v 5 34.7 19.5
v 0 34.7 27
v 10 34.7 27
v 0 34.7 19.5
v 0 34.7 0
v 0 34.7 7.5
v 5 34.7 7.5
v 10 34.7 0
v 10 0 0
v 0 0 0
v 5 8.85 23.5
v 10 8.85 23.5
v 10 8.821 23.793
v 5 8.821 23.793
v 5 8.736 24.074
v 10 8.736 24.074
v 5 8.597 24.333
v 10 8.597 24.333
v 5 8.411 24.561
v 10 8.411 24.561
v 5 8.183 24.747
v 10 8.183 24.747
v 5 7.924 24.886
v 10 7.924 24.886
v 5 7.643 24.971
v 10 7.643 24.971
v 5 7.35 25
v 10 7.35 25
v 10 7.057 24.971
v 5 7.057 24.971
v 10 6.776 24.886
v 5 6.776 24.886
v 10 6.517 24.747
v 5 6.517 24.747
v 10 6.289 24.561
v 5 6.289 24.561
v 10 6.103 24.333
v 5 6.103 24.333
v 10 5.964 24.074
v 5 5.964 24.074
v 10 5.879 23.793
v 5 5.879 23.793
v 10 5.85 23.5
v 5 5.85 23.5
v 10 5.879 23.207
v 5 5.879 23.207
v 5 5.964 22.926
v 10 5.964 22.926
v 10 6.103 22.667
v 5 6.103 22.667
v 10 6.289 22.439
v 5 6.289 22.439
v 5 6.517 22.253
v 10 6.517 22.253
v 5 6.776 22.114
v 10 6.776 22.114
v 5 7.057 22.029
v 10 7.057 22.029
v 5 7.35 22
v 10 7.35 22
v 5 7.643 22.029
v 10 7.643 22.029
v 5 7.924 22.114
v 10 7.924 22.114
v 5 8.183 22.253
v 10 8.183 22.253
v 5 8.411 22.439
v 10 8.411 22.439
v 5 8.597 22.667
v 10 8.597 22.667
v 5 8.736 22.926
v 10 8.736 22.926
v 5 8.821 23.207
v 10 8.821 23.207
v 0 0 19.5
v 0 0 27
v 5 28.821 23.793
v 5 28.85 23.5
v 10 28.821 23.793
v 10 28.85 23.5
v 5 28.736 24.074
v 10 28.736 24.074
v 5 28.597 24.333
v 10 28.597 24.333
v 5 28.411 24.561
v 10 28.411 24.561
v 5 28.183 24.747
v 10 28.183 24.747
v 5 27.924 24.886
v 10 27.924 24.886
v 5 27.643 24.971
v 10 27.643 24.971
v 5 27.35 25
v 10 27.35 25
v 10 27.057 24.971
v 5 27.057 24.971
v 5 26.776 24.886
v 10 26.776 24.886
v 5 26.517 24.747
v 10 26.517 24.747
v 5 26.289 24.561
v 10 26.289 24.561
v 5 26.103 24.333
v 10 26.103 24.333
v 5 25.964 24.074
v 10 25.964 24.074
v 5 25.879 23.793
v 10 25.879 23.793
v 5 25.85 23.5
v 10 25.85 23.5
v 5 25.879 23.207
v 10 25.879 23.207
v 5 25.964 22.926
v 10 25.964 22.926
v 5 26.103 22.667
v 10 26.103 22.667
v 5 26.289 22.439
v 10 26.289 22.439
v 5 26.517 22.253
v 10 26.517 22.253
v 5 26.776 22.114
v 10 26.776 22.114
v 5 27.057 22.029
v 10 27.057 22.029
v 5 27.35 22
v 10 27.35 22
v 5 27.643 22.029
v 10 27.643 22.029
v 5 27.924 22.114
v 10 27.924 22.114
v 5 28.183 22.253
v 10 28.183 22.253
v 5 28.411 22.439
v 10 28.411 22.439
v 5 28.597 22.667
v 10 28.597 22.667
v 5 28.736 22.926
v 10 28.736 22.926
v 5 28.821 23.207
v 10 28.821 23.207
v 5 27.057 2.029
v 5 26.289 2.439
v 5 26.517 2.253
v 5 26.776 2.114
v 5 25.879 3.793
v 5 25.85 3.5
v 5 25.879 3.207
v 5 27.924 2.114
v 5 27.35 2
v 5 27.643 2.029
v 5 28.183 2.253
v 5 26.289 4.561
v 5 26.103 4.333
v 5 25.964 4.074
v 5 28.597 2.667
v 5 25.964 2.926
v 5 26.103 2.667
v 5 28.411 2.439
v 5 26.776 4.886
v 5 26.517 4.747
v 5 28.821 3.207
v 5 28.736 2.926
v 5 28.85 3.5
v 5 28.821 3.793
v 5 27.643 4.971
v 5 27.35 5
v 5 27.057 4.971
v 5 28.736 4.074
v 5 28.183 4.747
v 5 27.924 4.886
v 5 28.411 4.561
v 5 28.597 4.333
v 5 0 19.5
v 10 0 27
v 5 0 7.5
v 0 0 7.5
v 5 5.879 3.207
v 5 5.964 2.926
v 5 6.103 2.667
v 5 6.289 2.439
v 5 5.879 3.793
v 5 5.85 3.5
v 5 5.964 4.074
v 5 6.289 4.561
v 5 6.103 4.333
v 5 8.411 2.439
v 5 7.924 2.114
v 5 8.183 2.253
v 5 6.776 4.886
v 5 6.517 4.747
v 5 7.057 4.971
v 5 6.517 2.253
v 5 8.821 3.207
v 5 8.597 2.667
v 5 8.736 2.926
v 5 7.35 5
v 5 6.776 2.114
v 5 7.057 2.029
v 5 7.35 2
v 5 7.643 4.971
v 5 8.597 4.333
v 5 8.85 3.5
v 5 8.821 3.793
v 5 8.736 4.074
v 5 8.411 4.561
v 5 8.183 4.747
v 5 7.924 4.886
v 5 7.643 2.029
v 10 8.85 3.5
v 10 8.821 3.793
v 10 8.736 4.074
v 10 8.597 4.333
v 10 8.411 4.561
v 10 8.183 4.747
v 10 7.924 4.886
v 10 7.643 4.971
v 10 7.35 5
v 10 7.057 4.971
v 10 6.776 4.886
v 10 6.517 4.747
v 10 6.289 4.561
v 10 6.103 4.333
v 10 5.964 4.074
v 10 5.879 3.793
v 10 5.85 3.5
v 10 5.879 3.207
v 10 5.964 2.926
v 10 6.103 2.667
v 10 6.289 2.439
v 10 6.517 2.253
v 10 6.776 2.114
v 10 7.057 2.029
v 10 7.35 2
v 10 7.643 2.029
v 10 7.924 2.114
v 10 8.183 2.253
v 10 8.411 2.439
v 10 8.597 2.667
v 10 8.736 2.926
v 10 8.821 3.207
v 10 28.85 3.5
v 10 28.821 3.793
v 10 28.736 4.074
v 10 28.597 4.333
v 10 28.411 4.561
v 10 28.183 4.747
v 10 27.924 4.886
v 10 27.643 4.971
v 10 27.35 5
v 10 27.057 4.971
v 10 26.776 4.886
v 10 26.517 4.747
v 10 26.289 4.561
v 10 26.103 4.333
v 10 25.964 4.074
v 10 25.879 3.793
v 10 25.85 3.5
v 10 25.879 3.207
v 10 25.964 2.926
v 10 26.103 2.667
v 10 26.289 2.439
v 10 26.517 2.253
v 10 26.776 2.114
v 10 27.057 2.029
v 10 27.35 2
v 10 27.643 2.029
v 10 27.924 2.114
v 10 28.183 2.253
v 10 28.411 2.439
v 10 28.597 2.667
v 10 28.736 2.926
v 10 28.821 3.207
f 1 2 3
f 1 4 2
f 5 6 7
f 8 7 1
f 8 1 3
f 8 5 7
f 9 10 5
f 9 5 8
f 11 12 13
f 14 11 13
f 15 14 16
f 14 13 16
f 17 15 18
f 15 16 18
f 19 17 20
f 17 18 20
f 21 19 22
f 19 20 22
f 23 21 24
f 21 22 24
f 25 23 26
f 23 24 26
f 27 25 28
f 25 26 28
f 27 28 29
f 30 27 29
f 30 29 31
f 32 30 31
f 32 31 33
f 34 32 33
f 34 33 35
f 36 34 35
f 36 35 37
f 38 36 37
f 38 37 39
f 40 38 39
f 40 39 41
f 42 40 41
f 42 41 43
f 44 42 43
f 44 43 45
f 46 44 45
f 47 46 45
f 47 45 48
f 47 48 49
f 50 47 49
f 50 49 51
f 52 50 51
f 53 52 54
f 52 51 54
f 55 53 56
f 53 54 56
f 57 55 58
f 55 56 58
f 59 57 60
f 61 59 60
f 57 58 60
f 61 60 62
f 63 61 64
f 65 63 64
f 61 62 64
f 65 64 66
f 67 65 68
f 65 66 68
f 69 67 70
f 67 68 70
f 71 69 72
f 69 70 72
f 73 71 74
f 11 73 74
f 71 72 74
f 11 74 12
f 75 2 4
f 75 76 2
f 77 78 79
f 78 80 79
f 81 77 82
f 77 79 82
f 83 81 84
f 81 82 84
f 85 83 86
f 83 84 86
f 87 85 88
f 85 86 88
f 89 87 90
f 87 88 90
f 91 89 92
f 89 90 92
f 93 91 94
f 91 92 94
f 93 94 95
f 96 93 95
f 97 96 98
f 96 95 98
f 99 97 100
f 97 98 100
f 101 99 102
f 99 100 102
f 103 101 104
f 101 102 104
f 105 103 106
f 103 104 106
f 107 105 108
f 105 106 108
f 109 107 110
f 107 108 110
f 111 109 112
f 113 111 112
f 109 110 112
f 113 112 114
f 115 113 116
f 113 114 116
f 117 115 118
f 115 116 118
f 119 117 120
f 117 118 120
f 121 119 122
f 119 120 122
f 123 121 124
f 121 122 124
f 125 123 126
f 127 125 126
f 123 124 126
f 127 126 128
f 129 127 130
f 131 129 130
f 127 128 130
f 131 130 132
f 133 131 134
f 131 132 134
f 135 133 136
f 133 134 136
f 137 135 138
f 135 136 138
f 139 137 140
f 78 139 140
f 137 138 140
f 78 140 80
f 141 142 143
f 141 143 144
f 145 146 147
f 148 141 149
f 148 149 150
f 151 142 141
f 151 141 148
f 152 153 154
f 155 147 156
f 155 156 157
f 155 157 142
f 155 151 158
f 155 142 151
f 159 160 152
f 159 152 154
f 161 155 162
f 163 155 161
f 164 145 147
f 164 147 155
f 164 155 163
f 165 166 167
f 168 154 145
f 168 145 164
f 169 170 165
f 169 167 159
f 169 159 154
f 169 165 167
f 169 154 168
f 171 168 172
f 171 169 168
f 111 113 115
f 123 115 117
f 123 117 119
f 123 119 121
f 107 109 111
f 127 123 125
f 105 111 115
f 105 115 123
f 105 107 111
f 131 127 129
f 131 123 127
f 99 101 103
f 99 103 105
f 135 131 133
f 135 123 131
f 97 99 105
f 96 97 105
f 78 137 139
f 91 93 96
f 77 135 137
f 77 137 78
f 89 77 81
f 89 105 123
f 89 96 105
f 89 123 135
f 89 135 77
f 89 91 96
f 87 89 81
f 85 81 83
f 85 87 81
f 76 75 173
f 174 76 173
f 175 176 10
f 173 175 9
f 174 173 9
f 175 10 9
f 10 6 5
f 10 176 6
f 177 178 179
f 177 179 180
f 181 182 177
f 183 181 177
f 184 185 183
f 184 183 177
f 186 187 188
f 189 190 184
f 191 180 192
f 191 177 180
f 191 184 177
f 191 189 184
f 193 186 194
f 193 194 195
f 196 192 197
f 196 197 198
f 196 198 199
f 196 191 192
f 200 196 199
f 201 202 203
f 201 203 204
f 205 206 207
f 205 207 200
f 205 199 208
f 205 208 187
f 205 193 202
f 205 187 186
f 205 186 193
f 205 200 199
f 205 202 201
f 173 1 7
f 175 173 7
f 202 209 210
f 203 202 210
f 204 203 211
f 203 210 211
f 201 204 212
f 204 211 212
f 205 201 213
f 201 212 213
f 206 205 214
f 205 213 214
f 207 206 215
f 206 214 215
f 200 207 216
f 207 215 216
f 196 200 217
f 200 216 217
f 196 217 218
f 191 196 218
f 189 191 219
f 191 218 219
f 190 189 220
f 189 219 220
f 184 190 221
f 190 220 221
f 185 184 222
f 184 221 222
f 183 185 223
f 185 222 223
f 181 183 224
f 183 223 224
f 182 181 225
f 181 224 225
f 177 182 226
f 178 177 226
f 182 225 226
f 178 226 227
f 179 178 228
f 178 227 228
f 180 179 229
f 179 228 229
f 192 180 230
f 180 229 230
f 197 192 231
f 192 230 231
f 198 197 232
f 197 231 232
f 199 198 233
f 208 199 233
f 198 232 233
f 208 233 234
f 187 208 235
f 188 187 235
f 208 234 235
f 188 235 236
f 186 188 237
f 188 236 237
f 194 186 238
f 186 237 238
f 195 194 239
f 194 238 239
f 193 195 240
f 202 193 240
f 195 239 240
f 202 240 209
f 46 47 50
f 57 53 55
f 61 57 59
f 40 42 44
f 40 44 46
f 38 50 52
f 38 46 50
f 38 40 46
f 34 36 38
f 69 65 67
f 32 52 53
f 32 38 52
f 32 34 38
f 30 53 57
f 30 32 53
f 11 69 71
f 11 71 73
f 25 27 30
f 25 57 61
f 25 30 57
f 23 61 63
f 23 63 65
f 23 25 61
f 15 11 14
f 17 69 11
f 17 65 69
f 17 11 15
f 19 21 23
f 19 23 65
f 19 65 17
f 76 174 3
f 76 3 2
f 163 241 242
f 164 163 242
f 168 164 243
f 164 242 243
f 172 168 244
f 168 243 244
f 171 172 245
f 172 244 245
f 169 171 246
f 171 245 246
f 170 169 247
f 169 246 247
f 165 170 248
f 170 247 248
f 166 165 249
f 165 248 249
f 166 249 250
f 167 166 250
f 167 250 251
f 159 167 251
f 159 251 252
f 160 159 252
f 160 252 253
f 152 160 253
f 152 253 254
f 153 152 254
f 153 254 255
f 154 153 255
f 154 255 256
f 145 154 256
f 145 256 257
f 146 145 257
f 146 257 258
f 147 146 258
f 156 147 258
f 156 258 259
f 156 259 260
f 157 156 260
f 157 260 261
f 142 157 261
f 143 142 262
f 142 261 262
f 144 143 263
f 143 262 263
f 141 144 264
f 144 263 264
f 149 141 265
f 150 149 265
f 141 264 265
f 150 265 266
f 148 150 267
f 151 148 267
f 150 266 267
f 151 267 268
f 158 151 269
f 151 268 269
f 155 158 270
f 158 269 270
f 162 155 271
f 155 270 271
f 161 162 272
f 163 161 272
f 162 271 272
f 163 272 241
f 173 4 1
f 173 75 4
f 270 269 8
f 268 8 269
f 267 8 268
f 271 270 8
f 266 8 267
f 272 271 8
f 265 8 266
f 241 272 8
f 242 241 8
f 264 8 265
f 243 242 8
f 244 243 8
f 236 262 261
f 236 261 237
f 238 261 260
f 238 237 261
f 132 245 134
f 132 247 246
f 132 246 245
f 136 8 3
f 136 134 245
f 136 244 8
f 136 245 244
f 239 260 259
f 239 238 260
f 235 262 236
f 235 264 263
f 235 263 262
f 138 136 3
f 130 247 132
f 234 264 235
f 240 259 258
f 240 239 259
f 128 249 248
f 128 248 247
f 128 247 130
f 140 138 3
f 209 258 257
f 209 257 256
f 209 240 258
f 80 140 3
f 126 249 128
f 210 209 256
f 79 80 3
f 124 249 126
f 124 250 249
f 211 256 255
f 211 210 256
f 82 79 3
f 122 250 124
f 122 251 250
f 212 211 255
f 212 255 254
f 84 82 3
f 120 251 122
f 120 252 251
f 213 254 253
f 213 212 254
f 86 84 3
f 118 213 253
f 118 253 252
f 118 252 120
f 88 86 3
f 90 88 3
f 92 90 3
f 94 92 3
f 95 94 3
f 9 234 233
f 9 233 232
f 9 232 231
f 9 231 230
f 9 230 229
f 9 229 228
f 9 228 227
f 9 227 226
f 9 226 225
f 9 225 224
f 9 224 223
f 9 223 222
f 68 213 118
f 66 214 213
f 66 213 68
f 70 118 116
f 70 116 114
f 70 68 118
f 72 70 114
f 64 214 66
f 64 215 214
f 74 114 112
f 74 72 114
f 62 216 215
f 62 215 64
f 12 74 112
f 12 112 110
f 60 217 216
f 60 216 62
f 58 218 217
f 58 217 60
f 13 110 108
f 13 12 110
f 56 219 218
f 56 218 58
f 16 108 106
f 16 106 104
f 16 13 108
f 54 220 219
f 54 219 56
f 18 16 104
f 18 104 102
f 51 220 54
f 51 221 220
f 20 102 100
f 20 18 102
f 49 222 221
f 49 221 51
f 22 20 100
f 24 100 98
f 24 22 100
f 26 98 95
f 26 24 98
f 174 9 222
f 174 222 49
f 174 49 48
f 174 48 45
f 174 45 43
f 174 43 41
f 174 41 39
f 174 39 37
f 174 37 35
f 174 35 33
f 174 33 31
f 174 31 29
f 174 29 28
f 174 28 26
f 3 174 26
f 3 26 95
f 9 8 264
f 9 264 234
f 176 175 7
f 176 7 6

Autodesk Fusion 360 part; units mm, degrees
sketch "Sketch1" plane through (0, 0, 0) normal (0, 1, 0) x (1, 0, 0)
  line L0 (0, 0) -> (10, 0)
  line L1 (10, 0) -> (10, -27)
  line L2 (10, -27) -> (0, -27)
  line L3 (0, -27) -> (0, 0)
  line L4 (0, -19.5) -> (5, -19.5)
  line L5 (5, -19.5) -> (5, -7.5)
  line L6 (5, -7.5) -> (0, -7.5)
  line L7 (0, -7.5) -> (0, -19.5)
  dimension "d1" = 10
  dimension "d2" = 27
  dimension "d3" = 12
  dimension "d4" = 5
  dimension "d6" = 7.5
extrude "Extrude1" add sketch "Sketch1" along normal blind 34.7 contours L0 L1 L2 L3 L4 L5 L6
sketch "Sketch2" plane through (10, 0, 0) normal (1, 0, 0) x (0, 1, 0)
  line L0 (0, 27) -> (0, 0)
  line L1 (0, 0) -> (34.7, 0)
  line L2 (34.7, 0) -> (34.7, 27)
  line L3 (34.7, 27) -> (0, 27)
  line L4 (7.35, 3.5) -> (27.35, 3.5)
  line L5 (27.35, 3.5) -> (27.35, 23.5)
  line L6 (27.35, 23.5) -> (7.35, 23.5)
  line L7 (7.35, 23.5) -> (7.35, 3.5)
  circle A0 centre (7.35, 23.5) radius 1.5
  circle A1 centre (27.35, 23.5) radius 1.5
  circle A2 centre (7.35, 3.5) radius 1.5
  circle A3 centre (27.35, 3.5) radius 1.5
  dimension "d9" = 20
  dimension "d10" = 20
  dimension "d11" = 3.5
  dimension "d12" = 7.35
  dimension "d13" = 3
  dimension "d14" = 3
  dimension "d15" = 3
  dimension "d16" = 3
extrude "Extrude2" cut sketch "Sketch2" against normal blind 5 contours L4 L7 A2 | L4 L7 A2 | L4 L5 A3 | L4 L5 A3 | L6 L7 A0 | L6 L7 A0 | L5 L6 A1 | L5 L6 A1
equation "d12 = 9.85 mm - 2.5 mm"
